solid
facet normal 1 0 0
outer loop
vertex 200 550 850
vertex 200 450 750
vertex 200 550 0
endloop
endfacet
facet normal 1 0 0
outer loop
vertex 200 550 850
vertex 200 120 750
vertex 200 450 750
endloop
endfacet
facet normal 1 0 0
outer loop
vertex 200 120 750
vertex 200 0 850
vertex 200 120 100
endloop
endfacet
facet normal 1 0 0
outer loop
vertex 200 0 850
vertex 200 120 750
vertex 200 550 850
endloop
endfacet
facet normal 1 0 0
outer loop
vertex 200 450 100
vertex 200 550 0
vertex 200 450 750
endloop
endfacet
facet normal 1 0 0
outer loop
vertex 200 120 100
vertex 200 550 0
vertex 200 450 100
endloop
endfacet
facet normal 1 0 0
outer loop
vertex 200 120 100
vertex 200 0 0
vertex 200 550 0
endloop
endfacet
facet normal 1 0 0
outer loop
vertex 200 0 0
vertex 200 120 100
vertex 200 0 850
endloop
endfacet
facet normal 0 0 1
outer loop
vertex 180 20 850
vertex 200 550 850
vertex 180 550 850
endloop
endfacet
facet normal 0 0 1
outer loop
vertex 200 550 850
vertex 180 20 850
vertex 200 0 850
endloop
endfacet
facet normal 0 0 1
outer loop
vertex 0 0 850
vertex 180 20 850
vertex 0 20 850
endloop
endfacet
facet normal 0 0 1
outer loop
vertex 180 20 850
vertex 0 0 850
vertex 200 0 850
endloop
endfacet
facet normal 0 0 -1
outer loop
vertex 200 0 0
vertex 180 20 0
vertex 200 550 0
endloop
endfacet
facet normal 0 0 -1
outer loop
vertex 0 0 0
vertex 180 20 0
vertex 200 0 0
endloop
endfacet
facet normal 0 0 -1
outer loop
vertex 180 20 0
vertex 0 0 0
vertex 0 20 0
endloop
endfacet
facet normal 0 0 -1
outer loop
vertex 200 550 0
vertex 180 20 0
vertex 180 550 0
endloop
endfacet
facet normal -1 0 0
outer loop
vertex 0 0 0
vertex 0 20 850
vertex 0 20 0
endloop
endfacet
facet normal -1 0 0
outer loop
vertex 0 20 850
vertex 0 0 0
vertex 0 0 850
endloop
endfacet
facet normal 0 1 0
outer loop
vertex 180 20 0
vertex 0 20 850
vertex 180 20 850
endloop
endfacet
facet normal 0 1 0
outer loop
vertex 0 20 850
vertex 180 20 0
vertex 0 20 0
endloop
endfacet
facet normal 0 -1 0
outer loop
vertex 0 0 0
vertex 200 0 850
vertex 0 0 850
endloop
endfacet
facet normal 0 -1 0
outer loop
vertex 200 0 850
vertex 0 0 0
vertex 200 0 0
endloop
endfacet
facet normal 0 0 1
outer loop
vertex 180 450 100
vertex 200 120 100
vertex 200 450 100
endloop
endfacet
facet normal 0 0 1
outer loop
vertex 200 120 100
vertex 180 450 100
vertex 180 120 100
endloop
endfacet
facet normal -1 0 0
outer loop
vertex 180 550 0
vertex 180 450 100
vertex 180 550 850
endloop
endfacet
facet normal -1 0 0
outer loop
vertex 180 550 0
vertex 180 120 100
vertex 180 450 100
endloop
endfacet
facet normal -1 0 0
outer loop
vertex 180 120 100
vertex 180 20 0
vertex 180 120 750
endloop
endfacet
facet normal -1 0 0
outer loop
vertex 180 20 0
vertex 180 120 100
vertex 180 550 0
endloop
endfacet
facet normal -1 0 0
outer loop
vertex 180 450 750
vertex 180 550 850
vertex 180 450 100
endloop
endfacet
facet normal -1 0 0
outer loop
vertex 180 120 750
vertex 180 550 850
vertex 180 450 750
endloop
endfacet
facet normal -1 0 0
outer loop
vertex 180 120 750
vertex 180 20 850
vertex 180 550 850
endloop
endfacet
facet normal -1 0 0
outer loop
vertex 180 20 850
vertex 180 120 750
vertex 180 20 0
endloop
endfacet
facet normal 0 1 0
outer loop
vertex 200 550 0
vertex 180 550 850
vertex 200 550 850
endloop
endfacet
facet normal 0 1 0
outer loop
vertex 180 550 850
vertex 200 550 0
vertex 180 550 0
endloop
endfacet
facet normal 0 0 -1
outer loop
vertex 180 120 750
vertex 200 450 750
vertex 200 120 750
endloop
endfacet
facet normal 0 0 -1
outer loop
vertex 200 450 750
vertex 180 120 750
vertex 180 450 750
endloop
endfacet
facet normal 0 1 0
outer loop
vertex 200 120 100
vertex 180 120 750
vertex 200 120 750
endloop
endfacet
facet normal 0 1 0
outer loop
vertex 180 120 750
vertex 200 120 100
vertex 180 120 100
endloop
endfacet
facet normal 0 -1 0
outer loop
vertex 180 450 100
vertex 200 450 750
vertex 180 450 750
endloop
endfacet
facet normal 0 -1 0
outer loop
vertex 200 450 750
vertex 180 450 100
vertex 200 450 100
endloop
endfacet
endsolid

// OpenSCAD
height = 850;
width = 200;
depth = 550;
front_thickness = 20;
side_thickness = 20;
panel_height = 100;
support_depth = panel_height;

module front() {
  color([0.7, 0.7, 0.9]) cube([width, front_thickness, height]);
}

module side_panel() {
  color([0.7, 0.9, 0.7]) cube([side_thickness, depth - front_thickness, panel_height]);
}

module support() {
  color([0.9, 0.7, 0.7]) cube([side_thickness, support_depth, height - 2*panel_height]);
}

front();
translate([width - side_thickness, front_thickness]) side_panel();
translate([width - side_thickness, front_thickness, height - panel_height]) side_panel();
translate([width - side_thickness, front_thickness, panel_height]) support();
translate([width - side_thickness, depth - support_depth, panel_height]) support();
